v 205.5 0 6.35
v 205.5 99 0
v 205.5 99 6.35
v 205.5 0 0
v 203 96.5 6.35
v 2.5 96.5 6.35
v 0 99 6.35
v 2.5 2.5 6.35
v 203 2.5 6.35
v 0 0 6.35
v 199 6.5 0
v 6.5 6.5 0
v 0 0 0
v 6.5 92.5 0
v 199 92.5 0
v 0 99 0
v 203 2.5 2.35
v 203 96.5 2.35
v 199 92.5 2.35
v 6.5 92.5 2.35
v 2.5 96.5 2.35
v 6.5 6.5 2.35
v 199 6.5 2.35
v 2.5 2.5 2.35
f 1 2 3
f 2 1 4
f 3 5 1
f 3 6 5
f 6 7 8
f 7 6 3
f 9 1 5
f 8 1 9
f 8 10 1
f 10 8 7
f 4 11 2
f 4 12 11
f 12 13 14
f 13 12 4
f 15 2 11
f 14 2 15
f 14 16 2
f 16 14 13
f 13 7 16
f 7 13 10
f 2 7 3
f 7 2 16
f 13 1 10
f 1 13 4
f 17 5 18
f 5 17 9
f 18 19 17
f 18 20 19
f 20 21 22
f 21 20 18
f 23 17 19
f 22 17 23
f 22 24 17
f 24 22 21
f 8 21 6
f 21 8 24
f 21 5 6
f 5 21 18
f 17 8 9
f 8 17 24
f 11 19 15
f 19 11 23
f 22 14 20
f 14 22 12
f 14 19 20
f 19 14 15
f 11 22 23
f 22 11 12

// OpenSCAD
sheet_thickness = 2.05;
card_size = [63.5, 88.0, 0.6];
number_of_cards = 3;

inner_border = 2;
outer_border = 2;

//  tray dimensions
tray_size = [
    card_size[0] * number_of_cards + inner_border * (number_of_cards + 1) + outer_border,
    card_size[1] + inner_border * 2 + outer_border,
    inner_border
];

// inner cavity dimensions
cavity_size = [
    tray_size[0] - outer_border,
    tray_size[1] - outer_border,
    tray_size[2] - card_size[2]
];

// Lid parameters
wall_thickness = 2.5;
acrylic_recess_depth = 0.3;  // How far down the acrylic sits
overhang = 3;  // Lip for acrylic
lid_height = tray_size[2] + sheet_thickness + acrylic_recess_depth;  

difference() {
    // Outer shell
    cube([
        tray_size[0] + wall_thickness * 2,
        tray_size[1] + wall_thickness * 2,
        lid_height + inner_border
    ]);
    
    // Inner cavity for tray
    translate([wall_thickness, wall_thickness, acrylic_recess_depth + sheet_thickness])
    cube([tray_size[0], tray_size[1], tray_size[2] + inner_border]);
    
    // Acrylic lip
    translate([
        wall_thickness + outer_border / 2 + overhang,
        wall_thickness + outer_border / 2 + overhang,
        acrylic_recess_depth
    ])
    cube([
        cavity_size[0] - overhang * 2,
        cavity_size[1] - overhang * 2,
        sheet_thickness
    ]);
    
    // Window cutout
    translate([
        wall_thickness + outer_border / 2 + overhang,
        wall_thickness + outer_border / 2 + overhang,
        0
    ])
    cube([
        cavity_size[0] - overhang * 2,
        cavity_size[1] - overhang * 2,
        acrylic_recess_depth + 0.1
    ]);
}
